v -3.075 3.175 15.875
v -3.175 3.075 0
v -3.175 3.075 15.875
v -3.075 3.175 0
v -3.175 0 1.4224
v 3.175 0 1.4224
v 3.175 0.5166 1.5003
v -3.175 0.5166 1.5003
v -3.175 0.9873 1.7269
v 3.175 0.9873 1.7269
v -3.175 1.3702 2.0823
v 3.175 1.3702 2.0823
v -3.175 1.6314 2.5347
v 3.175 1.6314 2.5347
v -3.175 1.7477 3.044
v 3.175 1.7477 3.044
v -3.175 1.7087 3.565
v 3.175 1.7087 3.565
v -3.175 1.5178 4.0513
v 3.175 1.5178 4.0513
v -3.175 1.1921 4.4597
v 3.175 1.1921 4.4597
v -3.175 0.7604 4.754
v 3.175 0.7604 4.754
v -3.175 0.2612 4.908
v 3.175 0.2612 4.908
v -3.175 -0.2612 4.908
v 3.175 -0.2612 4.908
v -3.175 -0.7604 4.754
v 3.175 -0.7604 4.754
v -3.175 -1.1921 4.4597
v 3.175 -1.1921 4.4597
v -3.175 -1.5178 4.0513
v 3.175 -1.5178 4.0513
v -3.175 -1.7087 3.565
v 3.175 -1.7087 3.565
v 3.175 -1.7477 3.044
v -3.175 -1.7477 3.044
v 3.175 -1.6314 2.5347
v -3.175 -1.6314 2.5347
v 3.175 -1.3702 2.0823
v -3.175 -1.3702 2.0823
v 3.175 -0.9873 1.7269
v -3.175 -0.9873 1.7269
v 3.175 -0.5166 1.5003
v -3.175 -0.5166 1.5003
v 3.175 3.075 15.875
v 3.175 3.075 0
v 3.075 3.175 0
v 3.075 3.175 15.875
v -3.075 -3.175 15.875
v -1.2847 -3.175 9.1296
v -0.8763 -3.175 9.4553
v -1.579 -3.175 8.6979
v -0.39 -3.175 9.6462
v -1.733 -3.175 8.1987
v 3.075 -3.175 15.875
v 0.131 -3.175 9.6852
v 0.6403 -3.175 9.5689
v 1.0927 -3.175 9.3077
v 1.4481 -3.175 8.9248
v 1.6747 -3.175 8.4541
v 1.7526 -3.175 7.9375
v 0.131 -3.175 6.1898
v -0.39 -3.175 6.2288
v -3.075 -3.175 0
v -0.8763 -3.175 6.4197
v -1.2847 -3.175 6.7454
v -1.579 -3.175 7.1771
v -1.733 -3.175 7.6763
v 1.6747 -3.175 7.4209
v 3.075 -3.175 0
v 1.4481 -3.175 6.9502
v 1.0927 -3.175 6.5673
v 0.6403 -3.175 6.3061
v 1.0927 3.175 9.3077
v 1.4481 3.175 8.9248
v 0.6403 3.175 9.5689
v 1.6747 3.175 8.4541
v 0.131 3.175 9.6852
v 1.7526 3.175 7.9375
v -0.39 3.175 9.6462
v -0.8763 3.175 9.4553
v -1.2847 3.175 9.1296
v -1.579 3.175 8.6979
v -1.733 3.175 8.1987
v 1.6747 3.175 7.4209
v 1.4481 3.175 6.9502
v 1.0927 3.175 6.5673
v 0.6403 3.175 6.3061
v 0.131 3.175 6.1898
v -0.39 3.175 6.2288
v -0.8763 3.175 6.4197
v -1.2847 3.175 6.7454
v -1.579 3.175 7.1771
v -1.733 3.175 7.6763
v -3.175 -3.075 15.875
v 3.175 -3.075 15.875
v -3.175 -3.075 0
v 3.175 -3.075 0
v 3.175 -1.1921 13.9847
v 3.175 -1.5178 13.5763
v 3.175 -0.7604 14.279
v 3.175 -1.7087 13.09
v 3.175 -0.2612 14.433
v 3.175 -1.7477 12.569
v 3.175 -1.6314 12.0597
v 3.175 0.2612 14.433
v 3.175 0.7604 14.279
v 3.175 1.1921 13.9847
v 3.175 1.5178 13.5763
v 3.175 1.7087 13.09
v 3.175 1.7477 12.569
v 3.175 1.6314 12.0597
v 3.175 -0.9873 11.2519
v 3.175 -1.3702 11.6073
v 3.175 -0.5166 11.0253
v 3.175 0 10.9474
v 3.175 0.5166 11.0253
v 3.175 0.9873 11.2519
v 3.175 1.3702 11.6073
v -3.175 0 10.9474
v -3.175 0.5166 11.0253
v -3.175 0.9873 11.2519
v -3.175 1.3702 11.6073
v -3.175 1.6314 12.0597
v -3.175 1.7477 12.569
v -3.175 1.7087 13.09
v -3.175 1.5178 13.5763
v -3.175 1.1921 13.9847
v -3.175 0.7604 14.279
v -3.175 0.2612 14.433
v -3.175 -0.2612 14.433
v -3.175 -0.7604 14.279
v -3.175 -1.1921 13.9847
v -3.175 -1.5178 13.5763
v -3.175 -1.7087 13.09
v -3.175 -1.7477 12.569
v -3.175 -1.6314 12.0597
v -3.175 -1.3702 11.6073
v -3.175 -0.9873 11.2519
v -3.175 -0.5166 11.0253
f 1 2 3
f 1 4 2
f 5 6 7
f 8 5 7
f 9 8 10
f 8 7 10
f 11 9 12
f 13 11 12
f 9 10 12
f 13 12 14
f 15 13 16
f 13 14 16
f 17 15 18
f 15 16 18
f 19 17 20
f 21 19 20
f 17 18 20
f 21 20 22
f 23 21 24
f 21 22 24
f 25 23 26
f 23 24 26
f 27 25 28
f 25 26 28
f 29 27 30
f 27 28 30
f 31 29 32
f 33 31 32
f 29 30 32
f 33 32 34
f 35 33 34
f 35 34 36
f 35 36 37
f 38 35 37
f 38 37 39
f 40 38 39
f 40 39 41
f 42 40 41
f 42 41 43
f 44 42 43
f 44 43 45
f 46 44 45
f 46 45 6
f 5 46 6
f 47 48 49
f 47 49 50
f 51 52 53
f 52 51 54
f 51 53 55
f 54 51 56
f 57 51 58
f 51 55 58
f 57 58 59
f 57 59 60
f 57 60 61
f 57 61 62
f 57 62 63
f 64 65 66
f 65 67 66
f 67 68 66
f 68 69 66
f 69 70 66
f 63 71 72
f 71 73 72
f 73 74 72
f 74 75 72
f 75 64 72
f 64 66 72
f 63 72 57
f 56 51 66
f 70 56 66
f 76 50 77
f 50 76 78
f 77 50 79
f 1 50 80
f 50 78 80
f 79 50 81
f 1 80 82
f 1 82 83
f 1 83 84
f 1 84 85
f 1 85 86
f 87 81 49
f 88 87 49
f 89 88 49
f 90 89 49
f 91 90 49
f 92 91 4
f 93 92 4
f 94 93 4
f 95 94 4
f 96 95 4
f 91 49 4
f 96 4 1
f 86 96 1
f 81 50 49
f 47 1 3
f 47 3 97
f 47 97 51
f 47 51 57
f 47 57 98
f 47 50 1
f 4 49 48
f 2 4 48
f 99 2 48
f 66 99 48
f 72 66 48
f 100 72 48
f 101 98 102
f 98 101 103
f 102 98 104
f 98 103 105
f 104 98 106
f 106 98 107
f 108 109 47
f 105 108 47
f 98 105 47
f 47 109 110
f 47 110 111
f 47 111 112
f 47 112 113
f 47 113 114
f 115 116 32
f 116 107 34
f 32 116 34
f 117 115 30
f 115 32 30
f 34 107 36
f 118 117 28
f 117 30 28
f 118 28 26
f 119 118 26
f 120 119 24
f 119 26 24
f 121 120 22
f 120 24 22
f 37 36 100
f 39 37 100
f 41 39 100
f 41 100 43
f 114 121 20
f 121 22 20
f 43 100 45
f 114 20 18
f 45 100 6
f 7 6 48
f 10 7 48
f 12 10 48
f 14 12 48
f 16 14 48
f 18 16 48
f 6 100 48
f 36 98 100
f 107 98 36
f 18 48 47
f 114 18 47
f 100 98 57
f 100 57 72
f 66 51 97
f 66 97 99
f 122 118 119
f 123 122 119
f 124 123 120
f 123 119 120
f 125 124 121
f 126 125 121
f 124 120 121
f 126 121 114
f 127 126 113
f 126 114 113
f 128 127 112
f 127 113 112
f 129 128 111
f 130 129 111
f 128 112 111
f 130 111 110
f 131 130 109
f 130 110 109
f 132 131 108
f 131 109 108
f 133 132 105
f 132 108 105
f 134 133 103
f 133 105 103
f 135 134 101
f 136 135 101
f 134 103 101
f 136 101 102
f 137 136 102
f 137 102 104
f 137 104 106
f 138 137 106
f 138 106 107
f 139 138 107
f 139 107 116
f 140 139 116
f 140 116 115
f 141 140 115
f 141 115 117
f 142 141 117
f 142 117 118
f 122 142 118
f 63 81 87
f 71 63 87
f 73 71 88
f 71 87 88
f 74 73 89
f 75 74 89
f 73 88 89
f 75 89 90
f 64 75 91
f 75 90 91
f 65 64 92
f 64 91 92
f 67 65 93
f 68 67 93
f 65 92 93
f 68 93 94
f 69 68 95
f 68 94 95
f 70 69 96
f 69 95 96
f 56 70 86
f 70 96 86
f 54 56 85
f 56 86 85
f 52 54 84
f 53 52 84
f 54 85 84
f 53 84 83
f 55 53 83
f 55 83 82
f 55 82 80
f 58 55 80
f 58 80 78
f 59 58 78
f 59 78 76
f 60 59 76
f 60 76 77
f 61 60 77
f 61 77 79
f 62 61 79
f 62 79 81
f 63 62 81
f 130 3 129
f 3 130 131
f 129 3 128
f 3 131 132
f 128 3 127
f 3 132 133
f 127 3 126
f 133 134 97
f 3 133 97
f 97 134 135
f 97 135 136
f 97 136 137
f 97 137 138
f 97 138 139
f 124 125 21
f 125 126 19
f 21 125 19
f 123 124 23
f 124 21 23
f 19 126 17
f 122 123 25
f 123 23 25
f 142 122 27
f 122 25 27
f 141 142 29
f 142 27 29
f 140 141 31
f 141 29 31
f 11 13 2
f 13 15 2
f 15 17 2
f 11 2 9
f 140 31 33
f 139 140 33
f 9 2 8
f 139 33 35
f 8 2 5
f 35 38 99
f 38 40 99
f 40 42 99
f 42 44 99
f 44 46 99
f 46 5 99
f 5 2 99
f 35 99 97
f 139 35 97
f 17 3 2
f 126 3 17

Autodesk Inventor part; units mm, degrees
ref_plane "YZ Plane" through (0, 0, 0) normal (1, 0, 0) x (0, 1, 0)
ref_plane "XZ Plane" through (0, 0, 0) normal (0, 1, 0) x (-1, 0, 0)
ref_plane "XY Plane" through (0, 0, 0) normal (0, 0, 1) x (1, 0, 0)
sketch "Sketch1" plane through (0, 0, 0) normal (0, 0, 1) x (1, 0, 0)
  line L0 (-3.175, -3.175) -> (3.175, -3.175)
  line L1 (3.175, -3.175) -> (3.175, 3.175)
  line L2 (3.175, 3.175) -> (-3.175, 3.175)
  line L3 (-3.175, 3.175) -> (-3.175, -3.175)
  line L4 (-3.175, -3.175) -> (3.175, 3.175) construction
  line L5 (3.175, -3.175) -> (-3.175, 3.175) construction
  point P0 (0, 0)
  dimension "d0" = 6.35
  dimension "d1" = 6.35
extrude "Extrusion1" add sketch "Sketch1" along normal blind 15.875
sketch "Sketch2" plane through (-3.175, 3.175, 0) normal (0, 1, 0) x (1, 0, 0)
  line L0 (3.175, 0) -> (3.175, -15.875) construction
  line L1 (6.35, -15.875) -> (0, -15.875) projected
  circle A0 centre (3.175, -7.9375) radius 1.7526
  circle A1 centre (3.175, -41.275) radius 1.4493 construction
  line L2 (6.35, 0) -> (0, 0) projected
  dimension "d4" = 3.5052
  dimension "d13" = 7.9375
extrude "Extrusion2" cut sketch "Sketch2" against normal through all
sketch "Sketch3" plane through (3.175, -3.175, 0) normal (1, 0, 0) x (0, 0, -1)
  line L0 (0, 3.175) -> (-15.875, 3.175) construction
  line L1 (-15.875, 0) -> (-15.875, 6.35) projected
  circle A0 centre (-12.7, 3.175) radius 1.7526
  circle A1 centre (-3.175, 3.175) radius 1.7526
  circle A2 centre (6.35, 3.175) radius 1.7526
  circle A3 centre (15.875, 3.175) radius 1.7526
  dimension "d16" = 3.5052
  dimension "d17" = 3.175
  dimension "d20" = 9.525
extrude "Extrusion3" cut sketch "Sketch3" against normal through all
chamfer "Chamfer1" distance 0.1 angle 45 4 edges at (-3.175, 3.175, 7.9375) (3.175, 3.175, 7.9375) (3.175, -3.175, 7.9375) (-3.175, -3.175, 7.9375)
properties part number "Nut Strip" material "Aluminum 6061"
